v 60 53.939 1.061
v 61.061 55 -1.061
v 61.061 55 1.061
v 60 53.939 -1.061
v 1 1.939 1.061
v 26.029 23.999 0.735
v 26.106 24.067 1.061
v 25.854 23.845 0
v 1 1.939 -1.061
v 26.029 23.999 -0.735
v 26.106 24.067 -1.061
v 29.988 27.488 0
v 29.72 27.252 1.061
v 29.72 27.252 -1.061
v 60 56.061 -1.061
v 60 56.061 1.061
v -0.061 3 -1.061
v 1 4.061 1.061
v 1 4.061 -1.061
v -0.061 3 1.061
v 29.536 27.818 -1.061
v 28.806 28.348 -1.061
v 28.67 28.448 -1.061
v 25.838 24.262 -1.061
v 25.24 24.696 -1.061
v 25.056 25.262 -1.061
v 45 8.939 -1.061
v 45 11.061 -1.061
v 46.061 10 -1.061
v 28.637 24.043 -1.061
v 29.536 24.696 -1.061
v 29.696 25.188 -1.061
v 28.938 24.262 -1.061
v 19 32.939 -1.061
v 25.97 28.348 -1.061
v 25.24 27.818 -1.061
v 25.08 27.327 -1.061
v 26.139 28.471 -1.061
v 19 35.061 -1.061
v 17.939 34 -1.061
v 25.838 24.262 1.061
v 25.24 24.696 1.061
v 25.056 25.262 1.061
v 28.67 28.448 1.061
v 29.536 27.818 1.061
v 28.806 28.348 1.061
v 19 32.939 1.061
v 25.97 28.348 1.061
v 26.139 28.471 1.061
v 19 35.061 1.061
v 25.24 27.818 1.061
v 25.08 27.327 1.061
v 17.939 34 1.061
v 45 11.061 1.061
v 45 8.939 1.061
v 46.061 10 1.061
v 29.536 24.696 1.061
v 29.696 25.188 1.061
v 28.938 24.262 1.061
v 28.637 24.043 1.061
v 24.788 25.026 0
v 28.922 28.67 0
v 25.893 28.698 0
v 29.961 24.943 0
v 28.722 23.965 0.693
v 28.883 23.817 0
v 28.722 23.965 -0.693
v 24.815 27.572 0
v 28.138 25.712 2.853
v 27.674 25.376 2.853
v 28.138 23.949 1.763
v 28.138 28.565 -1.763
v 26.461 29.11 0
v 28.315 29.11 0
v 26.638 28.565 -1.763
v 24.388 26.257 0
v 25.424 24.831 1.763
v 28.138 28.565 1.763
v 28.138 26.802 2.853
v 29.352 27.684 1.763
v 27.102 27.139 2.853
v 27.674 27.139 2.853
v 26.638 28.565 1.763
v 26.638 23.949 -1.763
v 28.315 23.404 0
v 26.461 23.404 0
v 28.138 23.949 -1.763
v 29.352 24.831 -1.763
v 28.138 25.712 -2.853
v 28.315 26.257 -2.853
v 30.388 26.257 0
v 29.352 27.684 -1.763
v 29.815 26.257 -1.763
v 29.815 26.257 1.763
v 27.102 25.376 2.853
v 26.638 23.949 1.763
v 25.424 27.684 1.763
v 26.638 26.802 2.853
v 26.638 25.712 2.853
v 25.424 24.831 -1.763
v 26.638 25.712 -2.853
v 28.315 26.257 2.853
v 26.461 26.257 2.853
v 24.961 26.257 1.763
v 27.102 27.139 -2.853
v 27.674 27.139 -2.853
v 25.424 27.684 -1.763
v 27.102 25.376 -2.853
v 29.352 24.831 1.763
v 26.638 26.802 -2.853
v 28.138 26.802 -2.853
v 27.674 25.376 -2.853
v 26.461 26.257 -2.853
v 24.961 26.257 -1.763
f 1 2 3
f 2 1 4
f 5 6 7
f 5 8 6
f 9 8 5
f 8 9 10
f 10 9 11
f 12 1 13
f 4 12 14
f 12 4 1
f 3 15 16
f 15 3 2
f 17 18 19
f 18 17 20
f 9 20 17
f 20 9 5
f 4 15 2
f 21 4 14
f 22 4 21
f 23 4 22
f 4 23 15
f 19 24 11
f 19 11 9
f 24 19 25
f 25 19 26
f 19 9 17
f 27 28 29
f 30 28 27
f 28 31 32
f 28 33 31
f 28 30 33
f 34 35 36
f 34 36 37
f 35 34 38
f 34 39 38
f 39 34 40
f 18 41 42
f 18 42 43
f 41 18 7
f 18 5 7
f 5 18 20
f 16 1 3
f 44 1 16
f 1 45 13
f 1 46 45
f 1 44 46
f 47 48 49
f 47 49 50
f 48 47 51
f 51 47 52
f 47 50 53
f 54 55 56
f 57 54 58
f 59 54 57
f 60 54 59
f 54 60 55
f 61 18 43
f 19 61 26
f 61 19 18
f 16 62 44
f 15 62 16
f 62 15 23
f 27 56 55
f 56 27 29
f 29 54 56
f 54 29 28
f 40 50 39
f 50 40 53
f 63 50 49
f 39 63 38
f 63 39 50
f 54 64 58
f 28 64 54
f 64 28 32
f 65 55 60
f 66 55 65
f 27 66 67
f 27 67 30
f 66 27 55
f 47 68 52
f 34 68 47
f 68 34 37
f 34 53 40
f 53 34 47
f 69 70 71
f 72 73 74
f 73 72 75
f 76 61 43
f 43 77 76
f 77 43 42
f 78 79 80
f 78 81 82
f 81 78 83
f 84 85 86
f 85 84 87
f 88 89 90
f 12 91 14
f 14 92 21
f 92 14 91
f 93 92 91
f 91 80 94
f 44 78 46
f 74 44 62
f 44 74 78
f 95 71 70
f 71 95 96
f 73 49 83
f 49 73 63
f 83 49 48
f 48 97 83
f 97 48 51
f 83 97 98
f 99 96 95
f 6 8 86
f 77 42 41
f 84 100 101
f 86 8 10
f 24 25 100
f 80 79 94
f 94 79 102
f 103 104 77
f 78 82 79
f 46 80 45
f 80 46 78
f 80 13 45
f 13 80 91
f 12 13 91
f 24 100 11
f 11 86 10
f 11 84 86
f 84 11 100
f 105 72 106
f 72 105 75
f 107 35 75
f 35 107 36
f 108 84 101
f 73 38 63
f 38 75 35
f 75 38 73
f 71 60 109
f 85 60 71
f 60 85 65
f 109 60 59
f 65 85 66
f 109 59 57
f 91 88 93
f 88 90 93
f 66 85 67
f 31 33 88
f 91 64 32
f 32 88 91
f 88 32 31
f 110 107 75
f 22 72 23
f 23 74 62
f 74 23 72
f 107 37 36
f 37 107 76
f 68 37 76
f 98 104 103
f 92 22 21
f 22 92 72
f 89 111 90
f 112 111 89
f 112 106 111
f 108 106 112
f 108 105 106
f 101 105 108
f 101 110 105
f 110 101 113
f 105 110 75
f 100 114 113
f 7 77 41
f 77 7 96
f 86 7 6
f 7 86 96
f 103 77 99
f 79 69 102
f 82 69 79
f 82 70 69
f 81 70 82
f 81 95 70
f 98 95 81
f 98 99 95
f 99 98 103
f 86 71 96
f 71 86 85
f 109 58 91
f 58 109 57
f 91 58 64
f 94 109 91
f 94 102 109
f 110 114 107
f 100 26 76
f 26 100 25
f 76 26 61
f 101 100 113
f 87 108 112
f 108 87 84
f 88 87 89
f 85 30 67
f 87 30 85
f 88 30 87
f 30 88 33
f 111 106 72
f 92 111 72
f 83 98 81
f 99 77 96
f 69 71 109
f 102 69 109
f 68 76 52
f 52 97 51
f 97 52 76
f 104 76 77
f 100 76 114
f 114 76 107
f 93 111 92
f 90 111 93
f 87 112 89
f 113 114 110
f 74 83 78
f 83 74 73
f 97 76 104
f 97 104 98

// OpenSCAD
//Find the intersection point of two segements

segement_a=[[1,3],[60,55]];

segement_b=[[45,10],[19,34]];
thickness=3;

module draw_line(p1,p2,thickness,fn=4){
    $fn=fn;    
    hull(){
        translate(p1)sphere(thickness/2);
        translate(p2)sphere(thickness/2);
        } }

segements=[segement_a,segement_b];


for(i=segements)
    draw_line(i[0],i[1],thickness,4);


function dot(v1,v2)=
    v1.x*v2.x+v1.y*v2.y;
    
function cross_(v1,v2)=
    v1.x*v2.y-v1.y*v2.x;


function intersection_point(segement_a,segement_b)=
    let(base_a=segement_a[1]-segement_a[0])
    let(side_ab=[segement_b[0].x-segement_a[0].x,segement_b[0].y-segement_a[0].y])
    let(side_b=segement_b[1]-segement_b[0])
    let(area_a=abs(cross_(base_a,side_ab)))
    let(area_b=abs(cross_(base_a,side_b))-area_a)
    let(x=(area_a*segement_b[1].x+area_b*segement_b[0].x)/(area_a+area_b))
    let(y=(area_a*segement_b[1].y+area_b*segement_b[0].y)/(area_a+area_b))
    [x,y];
   
test=intersection_point(segement_a,segement_b);
echo(test);

translate(test)
    color("red")
        sphere(3);
  
   
   
   
   
   
   
   
   
   
   
   
   
   
   
   
   
   
